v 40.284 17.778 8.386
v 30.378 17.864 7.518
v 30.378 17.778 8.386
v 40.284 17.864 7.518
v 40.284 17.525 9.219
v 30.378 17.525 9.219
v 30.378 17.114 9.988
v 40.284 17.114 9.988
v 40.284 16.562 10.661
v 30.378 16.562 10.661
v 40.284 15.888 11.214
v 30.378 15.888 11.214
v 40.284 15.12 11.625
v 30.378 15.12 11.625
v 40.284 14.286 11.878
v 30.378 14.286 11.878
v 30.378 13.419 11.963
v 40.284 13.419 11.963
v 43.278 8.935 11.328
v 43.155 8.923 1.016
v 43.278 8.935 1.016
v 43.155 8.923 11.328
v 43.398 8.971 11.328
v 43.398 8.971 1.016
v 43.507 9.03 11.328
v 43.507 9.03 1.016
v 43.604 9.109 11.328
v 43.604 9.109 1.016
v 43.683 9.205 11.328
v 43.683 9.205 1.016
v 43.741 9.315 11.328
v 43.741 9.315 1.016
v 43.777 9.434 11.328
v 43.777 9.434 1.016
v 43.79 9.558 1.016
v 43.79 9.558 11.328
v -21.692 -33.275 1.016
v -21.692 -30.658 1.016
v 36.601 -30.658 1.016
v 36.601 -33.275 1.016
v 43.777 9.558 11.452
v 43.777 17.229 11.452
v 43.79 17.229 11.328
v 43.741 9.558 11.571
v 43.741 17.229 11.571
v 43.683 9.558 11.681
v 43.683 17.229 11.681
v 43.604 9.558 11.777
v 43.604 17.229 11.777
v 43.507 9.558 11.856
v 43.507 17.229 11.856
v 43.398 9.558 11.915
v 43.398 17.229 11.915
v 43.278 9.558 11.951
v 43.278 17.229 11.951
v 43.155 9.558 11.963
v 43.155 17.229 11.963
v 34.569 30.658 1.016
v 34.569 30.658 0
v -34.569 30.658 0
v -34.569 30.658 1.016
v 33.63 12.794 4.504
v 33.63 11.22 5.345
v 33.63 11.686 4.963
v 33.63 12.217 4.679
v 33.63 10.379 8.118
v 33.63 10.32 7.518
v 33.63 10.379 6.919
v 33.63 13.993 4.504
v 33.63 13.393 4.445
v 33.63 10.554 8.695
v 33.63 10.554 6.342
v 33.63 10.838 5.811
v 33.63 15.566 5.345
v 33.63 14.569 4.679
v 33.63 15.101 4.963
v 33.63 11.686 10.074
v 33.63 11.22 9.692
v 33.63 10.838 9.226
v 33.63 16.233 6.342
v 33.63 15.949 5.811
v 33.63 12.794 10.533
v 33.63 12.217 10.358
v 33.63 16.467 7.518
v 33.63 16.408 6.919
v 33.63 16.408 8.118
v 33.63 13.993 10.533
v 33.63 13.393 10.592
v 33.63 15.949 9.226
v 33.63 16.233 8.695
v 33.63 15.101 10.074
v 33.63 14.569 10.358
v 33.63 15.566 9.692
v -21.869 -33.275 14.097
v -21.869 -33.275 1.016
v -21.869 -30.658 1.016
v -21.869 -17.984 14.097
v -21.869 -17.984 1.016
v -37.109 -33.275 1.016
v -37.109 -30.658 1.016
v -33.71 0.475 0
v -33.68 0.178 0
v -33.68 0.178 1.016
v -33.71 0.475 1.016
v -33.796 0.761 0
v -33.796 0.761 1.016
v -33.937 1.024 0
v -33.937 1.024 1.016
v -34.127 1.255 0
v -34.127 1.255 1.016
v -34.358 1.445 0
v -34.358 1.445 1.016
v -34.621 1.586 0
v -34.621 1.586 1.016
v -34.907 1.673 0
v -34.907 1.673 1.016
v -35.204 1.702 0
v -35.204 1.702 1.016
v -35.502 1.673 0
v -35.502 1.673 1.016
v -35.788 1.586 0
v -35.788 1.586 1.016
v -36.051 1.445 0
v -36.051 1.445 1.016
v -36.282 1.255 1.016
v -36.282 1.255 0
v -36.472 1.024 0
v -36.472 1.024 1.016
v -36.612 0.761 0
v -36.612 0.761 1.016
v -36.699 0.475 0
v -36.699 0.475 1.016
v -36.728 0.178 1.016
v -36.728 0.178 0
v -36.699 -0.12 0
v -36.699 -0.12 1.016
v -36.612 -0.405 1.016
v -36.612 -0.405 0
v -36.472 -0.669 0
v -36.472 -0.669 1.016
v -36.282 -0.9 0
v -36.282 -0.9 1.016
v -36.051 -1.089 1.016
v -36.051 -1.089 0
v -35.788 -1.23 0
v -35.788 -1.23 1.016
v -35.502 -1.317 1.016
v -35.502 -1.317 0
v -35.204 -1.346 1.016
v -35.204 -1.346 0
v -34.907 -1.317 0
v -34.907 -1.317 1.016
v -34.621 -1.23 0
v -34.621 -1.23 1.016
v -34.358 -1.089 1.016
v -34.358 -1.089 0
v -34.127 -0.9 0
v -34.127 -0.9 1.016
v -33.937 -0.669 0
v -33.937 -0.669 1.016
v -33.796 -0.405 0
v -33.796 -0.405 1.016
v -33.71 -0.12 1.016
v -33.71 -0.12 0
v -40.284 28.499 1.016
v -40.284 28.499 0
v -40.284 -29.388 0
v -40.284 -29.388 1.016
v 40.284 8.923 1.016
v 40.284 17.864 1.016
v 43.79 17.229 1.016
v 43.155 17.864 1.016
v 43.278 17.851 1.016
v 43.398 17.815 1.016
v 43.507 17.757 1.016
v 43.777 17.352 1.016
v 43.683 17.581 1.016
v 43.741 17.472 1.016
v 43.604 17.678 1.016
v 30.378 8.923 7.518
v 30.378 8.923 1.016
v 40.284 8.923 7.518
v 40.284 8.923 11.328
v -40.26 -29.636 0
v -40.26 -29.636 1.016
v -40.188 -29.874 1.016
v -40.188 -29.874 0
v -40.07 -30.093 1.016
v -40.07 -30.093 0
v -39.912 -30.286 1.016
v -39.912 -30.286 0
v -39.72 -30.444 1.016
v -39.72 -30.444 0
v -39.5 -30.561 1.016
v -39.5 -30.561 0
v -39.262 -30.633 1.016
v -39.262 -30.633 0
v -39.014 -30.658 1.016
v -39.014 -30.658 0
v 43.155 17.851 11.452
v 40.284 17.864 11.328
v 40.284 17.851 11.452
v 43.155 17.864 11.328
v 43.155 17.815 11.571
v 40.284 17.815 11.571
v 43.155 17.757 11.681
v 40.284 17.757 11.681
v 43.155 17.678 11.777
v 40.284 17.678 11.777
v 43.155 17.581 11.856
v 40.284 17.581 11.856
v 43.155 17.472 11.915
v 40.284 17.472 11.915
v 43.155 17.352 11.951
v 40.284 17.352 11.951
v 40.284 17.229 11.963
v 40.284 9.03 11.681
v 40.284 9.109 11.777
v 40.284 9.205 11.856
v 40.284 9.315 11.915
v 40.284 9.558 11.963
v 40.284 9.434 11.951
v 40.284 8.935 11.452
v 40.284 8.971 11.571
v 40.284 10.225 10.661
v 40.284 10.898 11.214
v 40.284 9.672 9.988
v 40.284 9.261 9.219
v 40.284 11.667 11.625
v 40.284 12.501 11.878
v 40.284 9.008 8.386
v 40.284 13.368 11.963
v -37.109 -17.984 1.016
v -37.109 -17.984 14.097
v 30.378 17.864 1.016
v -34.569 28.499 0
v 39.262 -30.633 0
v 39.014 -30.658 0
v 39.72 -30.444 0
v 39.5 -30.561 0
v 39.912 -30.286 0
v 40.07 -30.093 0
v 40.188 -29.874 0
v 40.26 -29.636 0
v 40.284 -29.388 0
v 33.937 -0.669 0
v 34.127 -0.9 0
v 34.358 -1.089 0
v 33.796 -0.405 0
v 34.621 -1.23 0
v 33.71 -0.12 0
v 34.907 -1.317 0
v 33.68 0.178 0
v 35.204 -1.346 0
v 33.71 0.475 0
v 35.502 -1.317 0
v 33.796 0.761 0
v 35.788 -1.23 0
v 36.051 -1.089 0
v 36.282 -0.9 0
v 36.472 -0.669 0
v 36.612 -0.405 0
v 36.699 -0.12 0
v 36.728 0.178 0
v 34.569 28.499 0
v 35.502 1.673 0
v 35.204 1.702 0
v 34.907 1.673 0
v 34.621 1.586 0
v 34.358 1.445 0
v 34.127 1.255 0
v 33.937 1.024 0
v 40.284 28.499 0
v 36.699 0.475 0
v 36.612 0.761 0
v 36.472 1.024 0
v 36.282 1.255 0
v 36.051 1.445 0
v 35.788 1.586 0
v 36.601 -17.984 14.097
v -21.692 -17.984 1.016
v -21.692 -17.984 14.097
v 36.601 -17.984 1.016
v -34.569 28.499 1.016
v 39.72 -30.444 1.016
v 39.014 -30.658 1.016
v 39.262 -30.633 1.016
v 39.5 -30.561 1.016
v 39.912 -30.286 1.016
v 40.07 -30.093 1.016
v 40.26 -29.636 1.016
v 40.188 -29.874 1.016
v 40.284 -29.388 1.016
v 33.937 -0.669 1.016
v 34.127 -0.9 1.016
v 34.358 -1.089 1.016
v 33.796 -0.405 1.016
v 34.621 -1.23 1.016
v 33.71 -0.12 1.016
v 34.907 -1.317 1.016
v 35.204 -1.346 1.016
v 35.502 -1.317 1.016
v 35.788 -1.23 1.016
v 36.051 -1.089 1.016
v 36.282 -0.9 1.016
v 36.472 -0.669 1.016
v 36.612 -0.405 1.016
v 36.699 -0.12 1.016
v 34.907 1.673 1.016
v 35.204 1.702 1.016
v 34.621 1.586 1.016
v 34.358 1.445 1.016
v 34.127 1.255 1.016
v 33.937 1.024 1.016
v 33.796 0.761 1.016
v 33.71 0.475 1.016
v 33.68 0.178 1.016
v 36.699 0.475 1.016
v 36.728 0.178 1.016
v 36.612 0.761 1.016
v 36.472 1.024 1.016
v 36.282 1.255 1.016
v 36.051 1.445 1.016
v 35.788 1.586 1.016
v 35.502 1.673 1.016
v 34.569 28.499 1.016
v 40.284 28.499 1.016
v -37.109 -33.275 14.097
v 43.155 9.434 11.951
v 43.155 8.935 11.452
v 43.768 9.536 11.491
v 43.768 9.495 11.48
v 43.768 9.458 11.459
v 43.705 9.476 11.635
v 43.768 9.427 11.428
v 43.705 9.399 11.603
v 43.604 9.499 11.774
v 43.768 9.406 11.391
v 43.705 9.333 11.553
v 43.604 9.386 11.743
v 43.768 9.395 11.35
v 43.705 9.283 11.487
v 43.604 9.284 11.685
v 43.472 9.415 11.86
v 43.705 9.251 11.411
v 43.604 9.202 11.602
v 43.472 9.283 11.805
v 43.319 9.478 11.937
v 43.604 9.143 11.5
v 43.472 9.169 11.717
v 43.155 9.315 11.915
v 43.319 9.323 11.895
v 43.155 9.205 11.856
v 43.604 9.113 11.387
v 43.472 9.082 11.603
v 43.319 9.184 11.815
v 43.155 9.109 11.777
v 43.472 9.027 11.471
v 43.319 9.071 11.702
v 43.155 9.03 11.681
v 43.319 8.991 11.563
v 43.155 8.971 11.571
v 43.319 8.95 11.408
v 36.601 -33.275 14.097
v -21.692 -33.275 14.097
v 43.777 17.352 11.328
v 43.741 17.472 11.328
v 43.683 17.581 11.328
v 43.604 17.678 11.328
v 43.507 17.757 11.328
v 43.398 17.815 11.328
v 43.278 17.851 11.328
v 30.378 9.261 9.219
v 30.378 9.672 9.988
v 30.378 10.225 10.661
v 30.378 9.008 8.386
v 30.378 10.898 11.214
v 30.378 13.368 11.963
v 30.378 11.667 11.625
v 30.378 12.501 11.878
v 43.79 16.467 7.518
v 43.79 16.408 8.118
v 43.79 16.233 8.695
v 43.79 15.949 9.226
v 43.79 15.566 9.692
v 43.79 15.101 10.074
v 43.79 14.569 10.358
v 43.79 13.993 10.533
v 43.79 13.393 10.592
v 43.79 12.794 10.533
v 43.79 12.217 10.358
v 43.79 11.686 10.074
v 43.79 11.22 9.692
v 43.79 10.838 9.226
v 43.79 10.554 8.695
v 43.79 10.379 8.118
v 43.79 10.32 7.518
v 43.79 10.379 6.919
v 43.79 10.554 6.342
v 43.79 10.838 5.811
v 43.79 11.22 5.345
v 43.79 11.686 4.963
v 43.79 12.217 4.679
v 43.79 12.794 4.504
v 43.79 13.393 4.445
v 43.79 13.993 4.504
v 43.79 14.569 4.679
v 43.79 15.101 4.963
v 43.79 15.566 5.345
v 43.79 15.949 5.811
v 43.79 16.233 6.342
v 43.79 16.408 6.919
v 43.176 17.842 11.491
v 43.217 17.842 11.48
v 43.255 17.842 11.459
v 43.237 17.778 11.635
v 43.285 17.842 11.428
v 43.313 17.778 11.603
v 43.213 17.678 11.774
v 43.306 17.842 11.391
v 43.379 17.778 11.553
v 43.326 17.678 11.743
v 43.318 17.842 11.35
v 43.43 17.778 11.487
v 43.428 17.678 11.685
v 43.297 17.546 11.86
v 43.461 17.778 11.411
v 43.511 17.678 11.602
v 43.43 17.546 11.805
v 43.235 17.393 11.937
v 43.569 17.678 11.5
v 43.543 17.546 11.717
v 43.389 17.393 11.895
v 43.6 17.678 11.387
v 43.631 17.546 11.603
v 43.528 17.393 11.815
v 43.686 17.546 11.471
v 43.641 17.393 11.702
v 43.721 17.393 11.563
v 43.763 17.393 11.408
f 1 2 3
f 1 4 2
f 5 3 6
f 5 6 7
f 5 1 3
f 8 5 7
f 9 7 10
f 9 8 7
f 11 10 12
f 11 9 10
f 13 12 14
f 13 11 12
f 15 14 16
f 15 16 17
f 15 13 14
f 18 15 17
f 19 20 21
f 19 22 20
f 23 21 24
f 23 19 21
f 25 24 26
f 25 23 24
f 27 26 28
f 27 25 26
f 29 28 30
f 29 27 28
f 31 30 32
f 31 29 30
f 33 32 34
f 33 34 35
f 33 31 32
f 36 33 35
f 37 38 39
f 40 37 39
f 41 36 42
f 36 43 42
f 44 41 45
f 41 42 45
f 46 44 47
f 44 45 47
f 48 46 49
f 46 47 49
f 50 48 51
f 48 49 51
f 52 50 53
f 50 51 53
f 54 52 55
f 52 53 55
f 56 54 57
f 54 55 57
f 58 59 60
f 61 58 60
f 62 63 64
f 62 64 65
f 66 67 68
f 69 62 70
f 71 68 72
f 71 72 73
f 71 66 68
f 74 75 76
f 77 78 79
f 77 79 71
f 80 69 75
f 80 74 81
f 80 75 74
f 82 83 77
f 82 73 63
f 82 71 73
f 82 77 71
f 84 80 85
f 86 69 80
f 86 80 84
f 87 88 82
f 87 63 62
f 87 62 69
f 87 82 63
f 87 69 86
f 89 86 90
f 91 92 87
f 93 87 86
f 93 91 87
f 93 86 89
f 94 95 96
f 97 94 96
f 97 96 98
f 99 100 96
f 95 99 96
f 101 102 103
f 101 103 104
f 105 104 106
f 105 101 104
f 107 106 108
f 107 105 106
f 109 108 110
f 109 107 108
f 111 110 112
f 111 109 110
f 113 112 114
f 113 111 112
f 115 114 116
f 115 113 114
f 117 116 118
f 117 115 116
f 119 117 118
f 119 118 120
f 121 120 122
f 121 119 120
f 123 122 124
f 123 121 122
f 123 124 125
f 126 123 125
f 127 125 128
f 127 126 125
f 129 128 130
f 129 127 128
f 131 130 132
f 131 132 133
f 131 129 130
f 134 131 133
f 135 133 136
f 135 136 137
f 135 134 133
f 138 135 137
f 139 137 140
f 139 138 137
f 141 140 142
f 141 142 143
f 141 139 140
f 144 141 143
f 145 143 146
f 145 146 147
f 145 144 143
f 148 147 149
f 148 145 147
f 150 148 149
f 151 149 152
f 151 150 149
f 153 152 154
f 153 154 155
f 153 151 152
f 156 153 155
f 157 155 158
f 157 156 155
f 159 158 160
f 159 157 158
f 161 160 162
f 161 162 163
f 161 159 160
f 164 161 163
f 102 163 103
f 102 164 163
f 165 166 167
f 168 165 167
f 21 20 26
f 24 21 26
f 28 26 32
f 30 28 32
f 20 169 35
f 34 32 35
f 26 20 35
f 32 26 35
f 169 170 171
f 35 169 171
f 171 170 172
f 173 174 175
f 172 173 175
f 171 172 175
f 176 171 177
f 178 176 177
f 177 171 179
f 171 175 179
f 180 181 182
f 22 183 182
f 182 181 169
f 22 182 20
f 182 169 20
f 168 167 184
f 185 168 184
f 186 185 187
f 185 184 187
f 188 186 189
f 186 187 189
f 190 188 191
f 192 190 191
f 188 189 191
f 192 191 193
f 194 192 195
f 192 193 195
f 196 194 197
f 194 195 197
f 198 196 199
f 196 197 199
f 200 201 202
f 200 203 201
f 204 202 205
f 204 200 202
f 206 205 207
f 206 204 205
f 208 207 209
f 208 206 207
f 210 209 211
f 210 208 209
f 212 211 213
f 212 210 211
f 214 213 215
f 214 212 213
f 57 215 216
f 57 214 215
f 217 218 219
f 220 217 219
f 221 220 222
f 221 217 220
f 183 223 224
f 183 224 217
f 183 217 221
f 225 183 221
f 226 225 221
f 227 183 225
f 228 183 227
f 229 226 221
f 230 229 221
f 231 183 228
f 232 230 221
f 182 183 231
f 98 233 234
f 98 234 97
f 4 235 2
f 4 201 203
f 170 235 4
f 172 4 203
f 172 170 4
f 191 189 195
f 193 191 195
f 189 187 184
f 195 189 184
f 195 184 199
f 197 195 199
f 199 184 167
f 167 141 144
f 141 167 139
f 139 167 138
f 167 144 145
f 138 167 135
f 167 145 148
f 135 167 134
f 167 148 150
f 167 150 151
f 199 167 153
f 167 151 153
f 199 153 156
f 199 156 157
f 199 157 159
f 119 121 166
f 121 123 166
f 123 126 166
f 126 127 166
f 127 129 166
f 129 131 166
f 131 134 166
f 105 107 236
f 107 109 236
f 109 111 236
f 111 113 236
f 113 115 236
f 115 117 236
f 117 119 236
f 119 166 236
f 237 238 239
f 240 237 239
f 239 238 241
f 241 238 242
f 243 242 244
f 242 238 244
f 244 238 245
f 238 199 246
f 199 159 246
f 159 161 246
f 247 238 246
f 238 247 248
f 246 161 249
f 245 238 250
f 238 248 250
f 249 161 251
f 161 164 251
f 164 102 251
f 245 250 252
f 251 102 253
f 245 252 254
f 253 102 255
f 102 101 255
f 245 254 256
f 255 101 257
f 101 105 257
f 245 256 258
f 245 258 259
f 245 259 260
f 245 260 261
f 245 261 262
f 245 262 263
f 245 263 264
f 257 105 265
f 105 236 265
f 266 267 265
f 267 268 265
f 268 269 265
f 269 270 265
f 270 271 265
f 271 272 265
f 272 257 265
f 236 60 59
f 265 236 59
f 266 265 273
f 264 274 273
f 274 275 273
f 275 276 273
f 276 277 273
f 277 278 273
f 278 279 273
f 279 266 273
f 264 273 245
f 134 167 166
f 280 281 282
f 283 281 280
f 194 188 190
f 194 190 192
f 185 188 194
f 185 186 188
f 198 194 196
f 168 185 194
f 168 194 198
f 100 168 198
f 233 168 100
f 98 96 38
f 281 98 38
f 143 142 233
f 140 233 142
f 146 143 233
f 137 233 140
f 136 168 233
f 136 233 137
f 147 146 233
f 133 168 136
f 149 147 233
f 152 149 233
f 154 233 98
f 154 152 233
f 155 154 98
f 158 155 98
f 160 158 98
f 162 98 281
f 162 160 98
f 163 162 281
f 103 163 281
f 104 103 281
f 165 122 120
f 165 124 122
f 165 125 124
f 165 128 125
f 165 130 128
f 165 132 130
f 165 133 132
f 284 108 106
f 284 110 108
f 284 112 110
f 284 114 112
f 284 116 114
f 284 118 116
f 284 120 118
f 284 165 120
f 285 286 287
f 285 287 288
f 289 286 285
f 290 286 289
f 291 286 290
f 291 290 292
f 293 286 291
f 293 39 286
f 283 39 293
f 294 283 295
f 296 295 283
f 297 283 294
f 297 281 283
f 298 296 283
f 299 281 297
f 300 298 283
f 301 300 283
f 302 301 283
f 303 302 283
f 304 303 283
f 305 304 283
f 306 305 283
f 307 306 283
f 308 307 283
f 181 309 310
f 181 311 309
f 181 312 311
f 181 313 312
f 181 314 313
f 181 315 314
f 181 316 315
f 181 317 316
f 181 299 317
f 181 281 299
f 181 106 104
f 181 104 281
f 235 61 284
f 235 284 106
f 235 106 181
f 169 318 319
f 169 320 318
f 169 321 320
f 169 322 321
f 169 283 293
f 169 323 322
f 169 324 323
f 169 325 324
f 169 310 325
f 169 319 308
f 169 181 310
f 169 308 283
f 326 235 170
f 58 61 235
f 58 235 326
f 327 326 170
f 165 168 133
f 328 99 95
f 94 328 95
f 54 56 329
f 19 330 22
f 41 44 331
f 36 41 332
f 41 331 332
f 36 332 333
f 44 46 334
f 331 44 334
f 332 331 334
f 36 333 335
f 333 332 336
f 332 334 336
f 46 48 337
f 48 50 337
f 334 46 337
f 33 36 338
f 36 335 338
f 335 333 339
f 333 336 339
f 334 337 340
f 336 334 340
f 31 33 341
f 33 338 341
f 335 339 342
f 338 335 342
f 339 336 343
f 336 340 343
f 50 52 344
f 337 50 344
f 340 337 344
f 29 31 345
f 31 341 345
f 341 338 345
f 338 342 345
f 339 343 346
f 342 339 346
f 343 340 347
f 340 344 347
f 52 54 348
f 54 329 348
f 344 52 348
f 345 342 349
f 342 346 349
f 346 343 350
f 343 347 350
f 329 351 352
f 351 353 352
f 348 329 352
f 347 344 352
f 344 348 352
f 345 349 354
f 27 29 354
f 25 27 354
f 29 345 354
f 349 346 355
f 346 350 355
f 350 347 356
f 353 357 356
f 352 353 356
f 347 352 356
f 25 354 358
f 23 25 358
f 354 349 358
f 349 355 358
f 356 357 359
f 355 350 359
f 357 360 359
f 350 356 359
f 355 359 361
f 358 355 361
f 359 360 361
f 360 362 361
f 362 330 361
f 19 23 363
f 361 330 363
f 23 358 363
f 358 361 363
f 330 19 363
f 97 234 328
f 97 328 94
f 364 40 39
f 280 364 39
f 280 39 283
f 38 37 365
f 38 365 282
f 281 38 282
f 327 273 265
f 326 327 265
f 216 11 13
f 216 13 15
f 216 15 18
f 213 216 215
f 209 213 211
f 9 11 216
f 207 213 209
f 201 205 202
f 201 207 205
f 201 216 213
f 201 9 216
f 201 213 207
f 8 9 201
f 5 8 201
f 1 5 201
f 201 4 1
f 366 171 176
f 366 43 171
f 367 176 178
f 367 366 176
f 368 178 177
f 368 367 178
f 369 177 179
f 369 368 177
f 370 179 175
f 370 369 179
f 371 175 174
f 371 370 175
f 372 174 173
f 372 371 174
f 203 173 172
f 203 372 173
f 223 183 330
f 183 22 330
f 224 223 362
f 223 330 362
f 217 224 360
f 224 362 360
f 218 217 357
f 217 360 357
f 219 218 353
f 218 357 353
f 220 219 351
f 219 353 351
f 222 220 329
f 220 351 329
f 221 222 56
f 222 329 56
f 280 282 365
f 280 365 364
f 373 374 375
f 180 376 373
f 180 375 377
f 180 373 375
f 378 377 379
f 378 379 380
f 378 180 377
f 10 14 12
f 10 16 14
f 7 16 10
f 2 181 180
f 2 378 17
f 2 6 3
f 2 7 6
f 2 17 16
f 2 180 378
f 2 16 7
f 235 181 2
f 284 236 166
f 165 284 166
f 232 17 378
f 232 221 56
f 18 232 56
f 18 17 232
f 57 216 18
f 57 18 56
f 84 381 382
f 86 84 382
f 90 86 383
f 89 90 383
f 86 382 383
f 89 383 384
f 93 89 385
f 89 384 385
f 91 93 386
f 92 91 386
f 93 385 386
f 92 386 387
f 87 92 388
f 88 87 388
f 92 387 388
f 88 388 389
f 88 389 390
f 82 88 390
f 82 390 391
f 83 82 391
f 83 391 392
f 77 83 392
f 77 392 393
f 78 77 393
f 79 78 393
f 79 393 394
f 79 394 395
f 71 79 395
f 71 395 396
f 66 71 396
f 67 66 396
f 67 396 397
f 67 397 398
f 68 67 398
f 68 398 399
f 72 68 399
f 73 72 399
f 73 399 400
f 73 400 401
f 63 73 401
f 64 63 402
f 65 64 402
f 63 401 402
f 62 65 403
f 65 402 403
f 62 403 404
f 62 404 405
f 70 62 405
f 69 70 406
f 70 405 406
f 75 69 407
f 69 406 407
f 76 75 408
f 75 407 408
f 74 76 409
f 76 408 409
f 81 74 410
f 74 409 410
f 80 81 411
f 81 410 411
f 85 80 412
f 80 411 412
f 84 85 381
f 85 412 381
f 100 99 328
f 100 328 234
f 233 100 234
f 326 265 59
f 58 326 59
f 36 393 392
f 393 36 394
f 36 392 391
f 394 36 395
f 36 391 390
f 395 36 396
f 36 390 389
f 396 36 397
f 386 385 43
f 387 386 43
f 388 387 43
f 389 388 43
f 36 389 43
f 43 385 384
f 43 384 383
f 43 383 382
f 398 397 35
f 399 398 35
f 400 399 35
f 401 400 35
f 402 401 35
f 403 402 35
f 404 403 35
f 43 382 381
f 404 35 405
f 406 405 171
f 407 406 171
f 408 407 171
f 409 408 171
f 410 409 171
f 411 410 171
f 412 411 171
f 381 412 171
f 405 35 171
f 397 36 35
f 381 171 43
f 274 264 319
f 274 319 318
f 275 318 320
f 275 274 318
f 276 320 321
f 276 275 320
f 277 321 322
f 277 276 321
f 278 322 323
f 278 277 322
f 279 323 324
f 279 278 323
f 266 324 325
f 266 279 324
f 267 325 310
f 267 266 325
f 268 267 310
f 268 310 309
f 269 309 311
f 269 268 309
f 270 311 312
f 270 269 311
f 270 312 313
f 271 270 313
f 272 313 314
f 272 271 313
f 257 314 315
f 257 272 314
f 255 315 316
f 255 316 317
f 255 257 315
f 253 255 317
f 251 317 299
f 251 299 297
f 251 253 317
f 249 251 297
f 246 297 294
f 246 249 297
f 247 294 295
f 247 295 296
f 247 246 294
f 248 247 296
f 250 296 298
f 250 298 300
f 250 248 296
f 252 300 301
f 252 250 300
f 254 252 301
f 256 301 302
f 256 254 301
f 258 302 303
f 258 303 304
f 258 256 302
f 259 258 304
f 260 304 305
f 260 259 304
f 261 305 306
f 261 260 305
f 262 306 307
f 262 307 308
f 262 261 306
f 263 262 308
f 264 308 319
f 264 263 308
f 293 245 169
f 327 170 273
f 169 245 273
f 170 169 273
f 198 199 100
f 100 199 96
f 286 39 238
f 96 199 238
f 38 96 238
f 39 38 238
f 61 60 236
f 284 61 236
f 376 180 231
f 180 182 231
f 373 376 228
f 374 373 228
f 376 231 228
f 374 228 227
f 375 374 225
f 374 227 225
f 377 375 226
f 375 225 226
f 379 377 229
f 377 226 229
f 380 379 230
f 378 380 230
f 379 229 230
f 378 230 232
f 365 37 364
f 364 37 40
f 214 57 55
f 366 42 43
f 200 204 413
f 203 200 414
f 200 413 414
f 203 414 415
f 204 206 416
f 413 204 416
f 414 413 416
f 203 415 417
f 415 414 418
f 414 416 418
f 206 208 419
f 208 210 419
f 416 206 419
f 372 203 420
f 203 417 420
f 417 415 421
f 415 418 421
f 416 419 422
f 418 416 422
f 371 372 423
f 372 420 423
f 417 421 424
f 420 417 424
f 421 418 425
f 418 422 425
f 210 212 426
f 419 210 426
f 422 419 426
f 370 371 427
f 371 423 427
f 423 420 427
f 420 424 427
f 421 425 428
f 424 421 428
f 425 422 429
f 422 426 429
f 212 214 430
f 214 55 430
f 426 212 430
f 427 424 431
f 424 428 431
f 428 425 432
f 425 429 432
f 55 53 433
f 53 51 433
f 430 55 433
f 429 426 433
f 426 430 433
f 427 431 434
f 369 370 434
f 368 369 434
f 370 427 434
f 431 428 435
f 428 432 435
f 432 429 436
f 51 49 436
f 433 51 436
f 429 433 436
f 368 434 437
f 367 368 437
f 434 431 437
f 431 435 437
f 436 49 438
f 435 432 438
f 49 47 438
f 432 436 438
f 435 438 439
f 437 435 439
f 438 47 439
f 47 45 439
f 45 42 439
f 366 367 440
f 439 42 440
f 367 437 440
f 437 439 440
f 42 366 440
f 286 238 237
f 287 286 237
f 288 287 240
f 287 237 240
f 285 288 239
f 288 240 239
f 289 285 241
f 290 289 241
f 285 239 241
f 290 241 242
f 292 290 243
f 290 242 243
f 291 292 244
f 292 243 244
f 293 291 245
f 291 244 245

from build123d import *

# Parameters (mm, degrees)
F0_R      = 1.524
F1_DEPTH  = 1.016
F2_W      = 3.5052
F2_H      = 8.9408
F3_DEPTH  = 10.9474
F2_W_2    = 9.906
F4_DEPTH  = 10.9474
F5_R      = 4.445
F6_R      = 0.635
F7_R      = 3.0734
F8_DEPTH  = 10.16
F9_W      = 58.293
F9_H      = 15.2908
F10_DEPTH = 13.081
F11_W     = 15.24
F11_H     = 15.2908
F12_DEPTH = 13.081


with BuildPart() as f1:
    # F0 (on Top) → F1 (new body)
    with BuildSketch(Plane.XY):
        with BuildLine():
            Line((-39.0144, -30.6578), (39.0144, -30.6578))
            ThreePointArc((39.0144, -30.6578), (39.9124256121, -30.2858256121), (40.2844, -29.3878))
            Line((40.2844, -29.3878), (40.2844, 28.4988))
            Line((40.2844, 28.4988), (34.5694, 28.4988))
            Line((34.5694, 28.4988), (34.5694, 30.6578))
            Line((34.5694, 30.6578), (-34.5694, 30.6578))
            Line((-34.5694, 30.6578), (-34.5694, 28.4988))
            Line((-34.5694, 28.4988), (-40.2844, 28.4988))
            Line((-40.2844, 28.4988), (-40.2844, -29.3878))
            ThreePointArc((-40.2844, -29.3878), (-39.9124256121, -30.2858256121), (-39.0144, -30.6578))
        make_face()
        with Locations((-35.2044, 0.1778)):
            Circle(F0_R, mode=Mode.SUBTRACT)
        with Locations((35.2044, 0.1778)):
            Circle(F0_R, mode=Mode.SUBTRACT)
    extrude(amount=F1_DEPTH)

    # F9 (on face) → F10 (join)
    with BuildSketch(Plane.XY.offset(1.016)):
        with Locations((7.4549, -25.6296345744)):
            Rectangle(F9_W, F9_H)
    extrude(amount=F10_DEPTH)



with BuildPart() as f3:
    # F2 (on face) → F3 (new body)
    with BuildSketch(Plane.XY.offset(1.016)):
        with Locations((42.037, 13.3931720629)):
            Rectangle(F2_W, F2_H)
    extrude(amount=F3_DEPTH)

    # F6
    f6_edges = [f3.edges().sort_by_distance(p)[0] for p in [
        (42.037, 8.922772, 11.9634),
        (43.7896, 13.393172, 11.9634),
        (42.037, 17.863572, 11.9634),
        (43.7896, 8.922772, 6.4897),
        (43.7896, 17.863572, 6.4897),
    ]]
    fillet(f6_edges, radius=F6_R)


with BuildPart() as f4:
    # F2 (on face) → F4 (new body)
    with BuildSketch(Plane.XY.offset(1.016)):
        with Locations((35.3314, 13.3931720629)):
            Rectangle(F2_W_2, F2_H)
    extrude(amount=F4_DEPTH)

    # F5
    f5_edges = [f4.edges().sort_by_distance(p)[0] for p in [
        (35.3314, 8.922772, 11.9634),
        (35.3314, 17.863572, 11.9634),
    ]]
    fillet(f5_edges, radius=F5_R)


with BuildPart() as f8_tool:
    # F7 (on face) → F8 (new body)
    with BuildSketch(Plane.YZ.offset(43.7896)):
        with Locations((13.3931720629, 7.5184)):
            Circle(F7_R)
    extrude(amount=-F8_DEPTH)


with BuildPart() as f3_1:
    add(f3.part)

    # F8: cut by f8_tool
    add(f8_tool.part, mode=Mode.SUBTRACT)


with BuildPart() as f4_1:
    add(f4.part)

    # F8: cut by f8_tool
    add(f8_tool.part, mode=Mode.SUBTRACT)


with BuildPart() as f1_1:
    add(f1.part)

    add(f3_1.part)  # F12 merges F3

    add(f4_1.part)  # F12 merges F4
    # F11 (on face) → F12 (join)
    with BuildSketch(Plane.XY.offset(1.016)):
        with Locations((-29.4894, -25.6296345744)):
            Rectangle(F11_W, F11_H)
    extrude(amount=F12_DEPTH)


solid = f1_1.part
